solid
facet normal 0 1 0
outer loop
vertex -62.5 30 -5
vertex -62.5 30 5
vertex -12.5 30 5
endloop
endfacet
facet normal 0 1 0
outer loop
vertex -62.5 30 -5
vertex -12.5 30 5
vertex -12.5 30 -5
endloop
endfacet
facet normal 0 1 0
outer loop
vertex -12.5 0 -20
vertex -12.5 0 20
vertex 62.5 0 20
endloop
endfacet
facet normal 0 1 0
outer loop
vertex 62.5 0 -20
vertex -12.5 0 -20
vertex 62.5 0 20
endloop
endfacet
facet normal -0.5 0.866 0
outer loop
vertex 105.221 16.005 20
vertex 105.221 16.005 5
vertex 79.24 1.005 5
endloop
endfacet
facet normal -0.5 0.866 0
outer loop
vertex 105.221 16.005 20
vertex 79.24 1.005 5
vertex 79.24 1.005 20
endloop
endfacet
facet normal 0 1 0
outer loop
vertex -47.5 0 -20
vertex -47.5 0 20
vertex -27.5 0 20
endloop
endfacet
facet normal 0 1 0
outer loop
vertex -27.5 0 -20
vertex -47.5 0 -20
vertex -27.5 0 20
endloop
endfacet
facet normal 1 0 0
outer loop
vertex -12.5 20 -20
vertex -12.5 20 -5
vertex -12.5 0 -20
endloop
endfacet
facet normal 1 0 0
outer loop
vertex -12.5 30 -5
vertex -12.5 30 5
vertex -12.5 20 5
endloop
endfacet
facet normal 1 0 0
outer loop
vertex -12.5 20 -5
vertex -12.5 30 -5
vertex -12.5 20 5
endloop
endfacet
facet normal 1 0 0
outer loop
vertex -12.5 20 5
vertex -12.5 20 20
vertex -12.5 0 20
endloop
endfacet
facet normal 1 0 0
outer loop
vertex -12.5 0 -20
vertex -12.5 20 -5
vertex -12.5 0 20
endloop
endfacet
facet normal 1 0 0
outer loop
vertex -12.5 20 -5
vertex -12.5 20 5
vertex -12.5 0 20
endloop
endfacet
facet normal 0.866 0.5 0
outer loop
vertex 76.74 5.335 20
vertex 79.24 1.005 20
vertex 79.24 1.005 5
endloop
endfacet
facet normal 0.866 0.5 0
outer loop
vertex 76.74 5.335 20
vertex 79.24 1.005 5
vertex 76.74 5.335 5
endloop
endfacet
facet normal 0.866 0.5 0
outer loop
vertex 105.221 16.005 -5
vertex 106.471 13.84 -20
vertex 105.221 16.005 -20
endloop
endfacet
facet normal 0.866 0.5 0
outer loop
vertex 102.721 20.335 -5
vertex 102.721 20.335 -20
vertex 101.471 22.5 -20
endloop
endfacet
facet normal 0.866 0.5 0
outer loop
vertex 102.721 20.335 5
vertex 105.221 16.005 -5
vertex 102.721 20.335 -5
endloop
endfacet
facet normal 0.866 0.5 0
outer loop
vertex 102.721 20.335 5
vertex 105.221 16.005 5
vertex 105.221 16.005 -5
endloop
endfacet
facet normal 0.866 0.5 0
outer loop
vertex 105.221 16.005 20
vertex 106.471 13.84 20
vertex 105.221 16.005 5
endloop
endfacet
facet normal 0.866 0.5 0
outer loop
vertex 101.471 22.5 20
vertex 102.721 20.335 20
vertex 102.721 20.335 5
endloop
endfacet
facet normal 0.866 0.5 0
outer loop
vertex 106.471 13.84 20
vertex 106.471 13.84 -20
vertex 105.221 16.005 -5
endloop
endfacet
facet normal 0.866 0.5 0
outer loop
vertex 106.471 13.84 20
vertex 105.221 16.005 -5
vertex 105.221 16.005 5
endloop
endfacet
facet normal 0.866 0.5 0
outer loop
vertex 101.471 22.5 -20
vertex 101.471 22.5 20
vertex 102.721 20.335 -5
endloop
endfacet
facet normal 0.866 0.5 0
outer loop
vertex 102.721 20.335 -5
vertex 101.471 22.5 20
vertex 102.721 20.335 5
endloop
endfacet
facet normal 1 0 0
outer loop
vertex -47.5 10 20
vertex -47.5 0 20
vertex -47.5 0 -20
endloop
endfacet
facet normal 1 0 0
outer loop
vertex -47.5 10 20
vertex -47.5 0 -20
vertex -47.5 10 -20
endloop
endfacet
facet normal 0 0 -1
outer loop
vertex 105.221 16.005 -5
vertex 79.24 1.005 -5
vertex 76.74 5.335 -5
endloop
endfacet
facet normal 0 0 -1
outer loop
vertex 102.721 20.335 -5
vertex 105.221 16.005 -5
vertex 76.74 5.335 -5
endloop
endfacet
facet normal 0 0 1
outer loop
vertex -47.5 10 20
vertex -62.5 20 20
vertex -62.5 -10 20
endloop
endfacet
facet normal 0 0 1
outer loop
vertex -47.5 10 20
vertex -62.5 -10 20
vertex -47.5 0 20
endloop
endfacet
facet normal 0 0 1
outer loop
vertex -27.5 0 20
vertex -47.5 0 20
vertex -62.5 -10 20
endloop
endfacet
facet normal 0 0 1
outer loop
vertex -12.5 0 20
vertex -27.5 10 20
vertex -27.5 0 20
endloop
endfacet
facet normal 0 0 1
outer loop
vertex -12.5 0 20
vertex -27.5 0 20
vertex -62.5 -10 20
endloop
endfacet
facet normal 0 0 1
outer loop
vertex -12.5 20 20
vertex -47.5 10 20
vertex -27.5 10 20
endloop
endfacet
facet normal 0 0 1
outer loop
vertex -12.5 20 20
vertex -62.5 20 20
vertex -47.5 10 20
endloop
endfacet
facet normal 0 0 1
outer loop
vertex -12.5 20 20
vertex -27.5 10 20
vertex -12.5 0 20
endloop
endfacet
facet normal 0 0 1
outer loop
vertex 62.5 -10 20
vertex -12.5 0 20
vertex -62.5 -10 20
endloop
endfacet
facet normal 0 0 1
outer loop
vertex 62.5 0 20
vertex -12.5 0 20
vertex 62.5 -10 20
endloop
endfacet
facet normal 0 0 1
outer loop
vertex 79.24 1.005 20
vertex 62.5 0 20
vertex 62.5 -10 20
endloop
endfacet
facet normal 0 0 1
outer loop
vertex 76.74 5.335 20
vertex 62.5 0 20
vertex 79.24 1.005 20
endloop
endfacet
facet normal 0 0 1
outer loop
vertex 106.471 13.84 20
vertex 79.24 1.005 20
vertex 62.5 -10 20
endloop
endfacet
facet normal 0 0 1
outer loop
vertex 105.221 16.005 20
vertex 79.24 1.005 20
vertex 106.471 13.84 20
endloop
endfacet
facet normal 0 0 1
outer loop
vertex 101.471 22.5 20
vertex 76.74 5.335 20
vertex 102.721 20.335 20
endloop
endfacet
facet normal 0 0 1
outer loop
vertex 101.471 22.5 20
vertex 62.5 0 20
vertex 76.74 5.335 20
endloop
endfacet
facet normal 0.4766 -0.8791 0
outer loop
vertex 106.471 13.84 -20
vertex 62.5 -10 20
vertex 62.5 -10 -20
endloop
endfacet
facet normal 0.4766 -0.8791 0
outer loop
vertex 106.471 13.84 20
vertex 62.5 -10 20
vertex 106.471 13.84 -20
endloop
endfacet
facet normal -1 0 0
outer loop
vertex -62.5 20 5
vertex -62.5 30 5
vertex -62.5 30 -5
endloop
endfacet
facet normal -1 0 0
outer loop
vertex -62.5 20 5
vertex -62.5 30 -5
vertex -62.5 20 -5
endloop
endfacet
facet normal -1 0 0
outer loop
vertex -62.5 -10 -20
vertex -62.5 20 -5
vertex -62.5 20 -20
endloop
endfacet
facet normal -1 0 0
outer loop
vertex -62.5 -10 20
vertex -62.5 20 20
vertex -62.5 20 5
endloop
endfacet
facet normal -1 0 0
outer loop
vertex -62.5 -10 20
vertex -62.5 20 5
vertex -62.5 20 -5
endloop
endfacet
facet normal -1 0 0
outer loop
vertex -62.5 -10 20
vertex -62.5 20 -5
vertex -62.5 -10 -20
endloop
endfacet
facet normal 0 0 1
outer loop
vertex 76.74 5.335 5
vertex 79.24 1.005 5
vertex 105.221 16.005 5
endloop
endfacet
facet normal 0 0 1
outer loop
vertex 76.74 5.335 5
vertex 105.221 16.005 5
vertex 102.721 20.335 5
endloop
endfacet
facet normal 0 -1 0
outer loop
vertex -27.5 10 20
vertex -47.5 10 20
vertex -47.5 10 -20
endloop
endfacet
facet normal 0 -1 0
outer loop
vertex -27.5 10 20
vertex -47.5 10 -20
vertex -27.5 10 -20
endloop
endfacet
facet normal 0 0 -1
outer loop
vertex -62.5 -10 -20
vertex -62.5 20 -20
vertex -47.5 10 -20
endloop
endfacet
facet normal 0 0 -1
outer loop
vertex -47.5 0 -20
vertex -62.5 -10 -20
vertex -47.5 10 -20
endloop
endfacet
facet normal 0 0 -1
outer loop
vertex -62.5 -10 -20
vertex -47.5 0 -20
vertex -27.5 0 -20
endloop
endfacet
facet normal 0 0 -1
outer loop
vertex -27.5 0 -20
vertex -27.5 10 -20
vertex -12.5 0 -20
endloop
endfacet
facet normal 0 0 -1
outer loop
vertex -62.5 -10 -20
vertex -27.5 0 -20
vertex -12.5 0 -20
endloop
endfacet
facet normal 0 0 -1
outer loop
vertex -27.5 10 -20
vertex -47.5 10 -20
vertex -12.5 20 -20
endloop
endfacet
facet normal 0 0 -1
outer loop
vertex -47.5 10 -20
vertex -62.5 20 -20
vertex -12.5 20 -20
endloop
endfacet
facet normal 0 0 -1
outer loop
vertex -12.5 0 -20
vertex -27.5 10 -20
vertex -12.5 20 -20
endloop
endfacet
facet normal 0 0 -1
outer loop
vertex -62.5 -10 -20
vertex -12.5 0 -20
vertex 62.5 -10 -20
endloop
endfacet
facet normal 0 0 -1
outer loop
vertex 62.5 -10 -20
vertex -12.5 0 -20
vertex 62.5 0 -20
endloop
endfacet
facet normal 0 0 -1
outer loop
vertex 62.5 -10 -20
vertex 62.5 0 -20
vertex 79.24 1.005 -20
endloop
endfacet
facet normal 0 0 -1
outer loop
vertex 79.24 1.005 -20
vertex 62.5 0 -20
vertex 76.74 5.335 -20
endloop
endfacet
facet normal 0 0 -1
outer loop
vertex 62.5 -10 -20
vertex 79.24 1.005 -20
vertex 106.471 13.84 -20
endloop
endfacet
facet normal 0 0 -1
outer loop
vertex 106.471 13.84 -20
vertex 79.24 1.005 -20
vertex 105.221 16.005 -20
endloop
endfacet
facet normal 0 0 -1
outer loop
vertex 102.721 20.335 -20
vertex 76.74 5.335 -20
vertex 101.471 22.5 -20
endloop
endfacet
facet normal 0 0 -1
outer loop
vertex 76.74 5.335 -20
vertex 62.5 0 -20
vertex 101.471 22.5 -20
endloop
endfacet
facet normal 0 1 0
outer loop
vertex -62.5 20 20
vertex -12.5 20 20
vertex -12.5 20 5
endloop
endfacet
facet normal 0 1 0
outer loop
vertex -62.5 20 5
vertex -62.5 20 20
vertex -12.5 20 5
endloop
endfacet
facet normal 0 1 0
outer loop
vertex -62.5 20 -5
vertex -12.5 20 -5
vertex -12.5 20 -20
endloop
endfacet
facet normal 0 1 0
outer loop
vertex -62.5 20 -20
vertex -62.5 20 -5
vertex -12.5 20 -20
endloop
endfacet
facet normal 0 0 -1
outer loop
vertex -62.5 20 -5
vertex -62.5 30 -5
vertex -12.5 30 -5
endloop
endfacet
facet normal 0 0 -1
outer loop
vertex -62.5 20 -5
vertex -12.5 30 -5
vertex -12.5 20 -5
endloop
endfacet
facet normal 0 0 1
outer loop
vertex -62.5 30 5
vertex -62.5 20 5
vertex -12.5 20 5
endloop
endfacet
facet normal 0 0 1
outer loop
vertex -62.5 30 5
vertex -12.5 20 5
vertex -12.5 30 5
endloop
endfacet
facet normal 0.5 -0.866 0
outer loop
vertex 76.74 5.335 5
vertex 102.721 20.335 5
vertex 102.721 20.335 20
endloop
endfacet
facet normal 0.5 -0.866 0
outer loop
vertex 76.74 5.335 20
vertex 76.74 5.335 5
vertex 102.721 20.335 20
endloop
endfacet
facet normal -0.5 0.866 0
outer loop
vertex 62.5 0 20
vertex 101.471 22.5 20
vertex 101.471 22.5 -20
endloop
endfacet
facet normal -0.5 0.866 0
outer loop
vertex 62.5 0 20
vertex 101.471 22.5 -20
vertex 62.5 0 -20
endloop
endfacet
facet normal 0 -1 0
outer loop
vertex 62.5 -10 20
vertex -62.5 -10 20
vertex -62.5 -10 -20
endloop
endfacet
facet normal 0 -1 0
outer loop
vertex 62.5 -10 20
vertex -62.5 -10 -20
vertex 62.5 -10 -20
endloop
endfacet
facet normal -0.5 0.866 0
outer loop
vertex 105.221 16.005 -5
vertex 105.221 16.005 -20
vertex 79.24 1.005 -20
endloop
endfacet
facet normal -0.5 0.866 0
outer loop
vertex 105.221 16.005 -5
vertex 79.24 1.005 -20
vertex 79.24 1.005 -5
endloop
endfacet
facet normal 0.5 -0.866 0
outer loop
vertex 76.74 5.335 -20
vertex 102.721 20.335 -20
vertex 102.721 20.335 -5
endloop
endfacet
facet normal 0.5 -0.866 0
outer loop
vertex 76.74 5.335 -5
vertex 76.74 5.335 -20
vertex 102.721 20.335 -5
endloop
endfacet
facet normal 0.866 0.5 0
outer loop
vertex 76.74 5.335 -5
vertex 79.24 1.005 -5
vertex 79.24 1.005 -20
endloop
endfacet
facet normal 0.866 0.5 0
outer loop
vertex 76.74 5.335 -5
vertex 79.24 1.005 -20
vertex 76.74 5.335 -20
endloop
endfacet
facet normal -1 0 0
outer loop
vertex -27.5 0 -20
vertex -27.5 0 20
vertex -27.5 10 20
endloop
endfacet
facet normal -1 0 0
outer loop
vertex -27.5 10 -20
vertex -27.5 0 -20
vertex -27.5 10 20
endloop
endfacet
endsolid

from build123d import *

# Parameters (mm, degrees)
F0_W          = 125
F0_H          = 40
F1_DEPTH      = 10
F3_DEPTH      = 50
F4_W          = 20
F4_H          = 10
F5_DEPTH      = 40
F5_DEPTH_BACK = 25
F7_DEPTH      = 40
F8_W          = 5
F8_H          = 15
F9_DEPTH      = 30


with BuildPart() as f1:
    # F0 (on Front) → F1 (new body)
    with BuildSketch(Plane.XZ):
        Rectangle(F0_W, F0_H)
    extrude(amount=F1_DEPTH)

    # F2 (on face) → F3 (join)
    with BuildSketch(Plane(origin=(-62.5, 0, 0), x_dir=(0, -1, 0), z_dir=(-1, 0, 0))):
        Polygon((-20, -20), (0, -20), (0, 0), (-30, 0), (-30, -5), (-20, -5), align=None)
        Polygon((-30, 0), (0, 0), (0, 20), (-20, 20), (-20, 5), (-30, 5), align=None)
    extrude(amount=-F3_DEPTH)

    # F4 (on face) → F5 (cut, two sides)
    with BuildSketch(Plane.XY.offset(20)) as f5_sk:
        with Locations((-37.5, 5)):
            Rectangle(F4_W, F4_H)
    extrude(amount=-F5_DEPTH, mode=Mode.SUBTRACT)
    extrude(f5_sk.sketch, amount=-F5_DEPTH_BACK, mode=Mode.SUBTRACT)

    # F6 (on face) → F7 (join)
    with BuildSketch(Plane.XY.offset(20)):
        Polygon((101.471143, 22.5), (62.5, 0), (62.5, -10), (106.471143, 13.839746), align=None)
    extrude(amount=-F7_DEPTH)

    # F8 (on face) → F9 (cut)
    with BuildSketch(Plane(origin=(85.846143, 49.563294, 0), x_dir=(-0.5, 0.866025, 0), z_dir=(0.866025, 0.5, 0))):
        with Locations((-36.25, -12.5)):
            Rectangle(F8_W, F8_H)
        with Locations((-36.25, 12.5)):
            Rectangle(F8_W, F8_H)
    extrude(amount=-F9_DEPTH, mode=Mode.SUBTRACT)


solid = f1.part
